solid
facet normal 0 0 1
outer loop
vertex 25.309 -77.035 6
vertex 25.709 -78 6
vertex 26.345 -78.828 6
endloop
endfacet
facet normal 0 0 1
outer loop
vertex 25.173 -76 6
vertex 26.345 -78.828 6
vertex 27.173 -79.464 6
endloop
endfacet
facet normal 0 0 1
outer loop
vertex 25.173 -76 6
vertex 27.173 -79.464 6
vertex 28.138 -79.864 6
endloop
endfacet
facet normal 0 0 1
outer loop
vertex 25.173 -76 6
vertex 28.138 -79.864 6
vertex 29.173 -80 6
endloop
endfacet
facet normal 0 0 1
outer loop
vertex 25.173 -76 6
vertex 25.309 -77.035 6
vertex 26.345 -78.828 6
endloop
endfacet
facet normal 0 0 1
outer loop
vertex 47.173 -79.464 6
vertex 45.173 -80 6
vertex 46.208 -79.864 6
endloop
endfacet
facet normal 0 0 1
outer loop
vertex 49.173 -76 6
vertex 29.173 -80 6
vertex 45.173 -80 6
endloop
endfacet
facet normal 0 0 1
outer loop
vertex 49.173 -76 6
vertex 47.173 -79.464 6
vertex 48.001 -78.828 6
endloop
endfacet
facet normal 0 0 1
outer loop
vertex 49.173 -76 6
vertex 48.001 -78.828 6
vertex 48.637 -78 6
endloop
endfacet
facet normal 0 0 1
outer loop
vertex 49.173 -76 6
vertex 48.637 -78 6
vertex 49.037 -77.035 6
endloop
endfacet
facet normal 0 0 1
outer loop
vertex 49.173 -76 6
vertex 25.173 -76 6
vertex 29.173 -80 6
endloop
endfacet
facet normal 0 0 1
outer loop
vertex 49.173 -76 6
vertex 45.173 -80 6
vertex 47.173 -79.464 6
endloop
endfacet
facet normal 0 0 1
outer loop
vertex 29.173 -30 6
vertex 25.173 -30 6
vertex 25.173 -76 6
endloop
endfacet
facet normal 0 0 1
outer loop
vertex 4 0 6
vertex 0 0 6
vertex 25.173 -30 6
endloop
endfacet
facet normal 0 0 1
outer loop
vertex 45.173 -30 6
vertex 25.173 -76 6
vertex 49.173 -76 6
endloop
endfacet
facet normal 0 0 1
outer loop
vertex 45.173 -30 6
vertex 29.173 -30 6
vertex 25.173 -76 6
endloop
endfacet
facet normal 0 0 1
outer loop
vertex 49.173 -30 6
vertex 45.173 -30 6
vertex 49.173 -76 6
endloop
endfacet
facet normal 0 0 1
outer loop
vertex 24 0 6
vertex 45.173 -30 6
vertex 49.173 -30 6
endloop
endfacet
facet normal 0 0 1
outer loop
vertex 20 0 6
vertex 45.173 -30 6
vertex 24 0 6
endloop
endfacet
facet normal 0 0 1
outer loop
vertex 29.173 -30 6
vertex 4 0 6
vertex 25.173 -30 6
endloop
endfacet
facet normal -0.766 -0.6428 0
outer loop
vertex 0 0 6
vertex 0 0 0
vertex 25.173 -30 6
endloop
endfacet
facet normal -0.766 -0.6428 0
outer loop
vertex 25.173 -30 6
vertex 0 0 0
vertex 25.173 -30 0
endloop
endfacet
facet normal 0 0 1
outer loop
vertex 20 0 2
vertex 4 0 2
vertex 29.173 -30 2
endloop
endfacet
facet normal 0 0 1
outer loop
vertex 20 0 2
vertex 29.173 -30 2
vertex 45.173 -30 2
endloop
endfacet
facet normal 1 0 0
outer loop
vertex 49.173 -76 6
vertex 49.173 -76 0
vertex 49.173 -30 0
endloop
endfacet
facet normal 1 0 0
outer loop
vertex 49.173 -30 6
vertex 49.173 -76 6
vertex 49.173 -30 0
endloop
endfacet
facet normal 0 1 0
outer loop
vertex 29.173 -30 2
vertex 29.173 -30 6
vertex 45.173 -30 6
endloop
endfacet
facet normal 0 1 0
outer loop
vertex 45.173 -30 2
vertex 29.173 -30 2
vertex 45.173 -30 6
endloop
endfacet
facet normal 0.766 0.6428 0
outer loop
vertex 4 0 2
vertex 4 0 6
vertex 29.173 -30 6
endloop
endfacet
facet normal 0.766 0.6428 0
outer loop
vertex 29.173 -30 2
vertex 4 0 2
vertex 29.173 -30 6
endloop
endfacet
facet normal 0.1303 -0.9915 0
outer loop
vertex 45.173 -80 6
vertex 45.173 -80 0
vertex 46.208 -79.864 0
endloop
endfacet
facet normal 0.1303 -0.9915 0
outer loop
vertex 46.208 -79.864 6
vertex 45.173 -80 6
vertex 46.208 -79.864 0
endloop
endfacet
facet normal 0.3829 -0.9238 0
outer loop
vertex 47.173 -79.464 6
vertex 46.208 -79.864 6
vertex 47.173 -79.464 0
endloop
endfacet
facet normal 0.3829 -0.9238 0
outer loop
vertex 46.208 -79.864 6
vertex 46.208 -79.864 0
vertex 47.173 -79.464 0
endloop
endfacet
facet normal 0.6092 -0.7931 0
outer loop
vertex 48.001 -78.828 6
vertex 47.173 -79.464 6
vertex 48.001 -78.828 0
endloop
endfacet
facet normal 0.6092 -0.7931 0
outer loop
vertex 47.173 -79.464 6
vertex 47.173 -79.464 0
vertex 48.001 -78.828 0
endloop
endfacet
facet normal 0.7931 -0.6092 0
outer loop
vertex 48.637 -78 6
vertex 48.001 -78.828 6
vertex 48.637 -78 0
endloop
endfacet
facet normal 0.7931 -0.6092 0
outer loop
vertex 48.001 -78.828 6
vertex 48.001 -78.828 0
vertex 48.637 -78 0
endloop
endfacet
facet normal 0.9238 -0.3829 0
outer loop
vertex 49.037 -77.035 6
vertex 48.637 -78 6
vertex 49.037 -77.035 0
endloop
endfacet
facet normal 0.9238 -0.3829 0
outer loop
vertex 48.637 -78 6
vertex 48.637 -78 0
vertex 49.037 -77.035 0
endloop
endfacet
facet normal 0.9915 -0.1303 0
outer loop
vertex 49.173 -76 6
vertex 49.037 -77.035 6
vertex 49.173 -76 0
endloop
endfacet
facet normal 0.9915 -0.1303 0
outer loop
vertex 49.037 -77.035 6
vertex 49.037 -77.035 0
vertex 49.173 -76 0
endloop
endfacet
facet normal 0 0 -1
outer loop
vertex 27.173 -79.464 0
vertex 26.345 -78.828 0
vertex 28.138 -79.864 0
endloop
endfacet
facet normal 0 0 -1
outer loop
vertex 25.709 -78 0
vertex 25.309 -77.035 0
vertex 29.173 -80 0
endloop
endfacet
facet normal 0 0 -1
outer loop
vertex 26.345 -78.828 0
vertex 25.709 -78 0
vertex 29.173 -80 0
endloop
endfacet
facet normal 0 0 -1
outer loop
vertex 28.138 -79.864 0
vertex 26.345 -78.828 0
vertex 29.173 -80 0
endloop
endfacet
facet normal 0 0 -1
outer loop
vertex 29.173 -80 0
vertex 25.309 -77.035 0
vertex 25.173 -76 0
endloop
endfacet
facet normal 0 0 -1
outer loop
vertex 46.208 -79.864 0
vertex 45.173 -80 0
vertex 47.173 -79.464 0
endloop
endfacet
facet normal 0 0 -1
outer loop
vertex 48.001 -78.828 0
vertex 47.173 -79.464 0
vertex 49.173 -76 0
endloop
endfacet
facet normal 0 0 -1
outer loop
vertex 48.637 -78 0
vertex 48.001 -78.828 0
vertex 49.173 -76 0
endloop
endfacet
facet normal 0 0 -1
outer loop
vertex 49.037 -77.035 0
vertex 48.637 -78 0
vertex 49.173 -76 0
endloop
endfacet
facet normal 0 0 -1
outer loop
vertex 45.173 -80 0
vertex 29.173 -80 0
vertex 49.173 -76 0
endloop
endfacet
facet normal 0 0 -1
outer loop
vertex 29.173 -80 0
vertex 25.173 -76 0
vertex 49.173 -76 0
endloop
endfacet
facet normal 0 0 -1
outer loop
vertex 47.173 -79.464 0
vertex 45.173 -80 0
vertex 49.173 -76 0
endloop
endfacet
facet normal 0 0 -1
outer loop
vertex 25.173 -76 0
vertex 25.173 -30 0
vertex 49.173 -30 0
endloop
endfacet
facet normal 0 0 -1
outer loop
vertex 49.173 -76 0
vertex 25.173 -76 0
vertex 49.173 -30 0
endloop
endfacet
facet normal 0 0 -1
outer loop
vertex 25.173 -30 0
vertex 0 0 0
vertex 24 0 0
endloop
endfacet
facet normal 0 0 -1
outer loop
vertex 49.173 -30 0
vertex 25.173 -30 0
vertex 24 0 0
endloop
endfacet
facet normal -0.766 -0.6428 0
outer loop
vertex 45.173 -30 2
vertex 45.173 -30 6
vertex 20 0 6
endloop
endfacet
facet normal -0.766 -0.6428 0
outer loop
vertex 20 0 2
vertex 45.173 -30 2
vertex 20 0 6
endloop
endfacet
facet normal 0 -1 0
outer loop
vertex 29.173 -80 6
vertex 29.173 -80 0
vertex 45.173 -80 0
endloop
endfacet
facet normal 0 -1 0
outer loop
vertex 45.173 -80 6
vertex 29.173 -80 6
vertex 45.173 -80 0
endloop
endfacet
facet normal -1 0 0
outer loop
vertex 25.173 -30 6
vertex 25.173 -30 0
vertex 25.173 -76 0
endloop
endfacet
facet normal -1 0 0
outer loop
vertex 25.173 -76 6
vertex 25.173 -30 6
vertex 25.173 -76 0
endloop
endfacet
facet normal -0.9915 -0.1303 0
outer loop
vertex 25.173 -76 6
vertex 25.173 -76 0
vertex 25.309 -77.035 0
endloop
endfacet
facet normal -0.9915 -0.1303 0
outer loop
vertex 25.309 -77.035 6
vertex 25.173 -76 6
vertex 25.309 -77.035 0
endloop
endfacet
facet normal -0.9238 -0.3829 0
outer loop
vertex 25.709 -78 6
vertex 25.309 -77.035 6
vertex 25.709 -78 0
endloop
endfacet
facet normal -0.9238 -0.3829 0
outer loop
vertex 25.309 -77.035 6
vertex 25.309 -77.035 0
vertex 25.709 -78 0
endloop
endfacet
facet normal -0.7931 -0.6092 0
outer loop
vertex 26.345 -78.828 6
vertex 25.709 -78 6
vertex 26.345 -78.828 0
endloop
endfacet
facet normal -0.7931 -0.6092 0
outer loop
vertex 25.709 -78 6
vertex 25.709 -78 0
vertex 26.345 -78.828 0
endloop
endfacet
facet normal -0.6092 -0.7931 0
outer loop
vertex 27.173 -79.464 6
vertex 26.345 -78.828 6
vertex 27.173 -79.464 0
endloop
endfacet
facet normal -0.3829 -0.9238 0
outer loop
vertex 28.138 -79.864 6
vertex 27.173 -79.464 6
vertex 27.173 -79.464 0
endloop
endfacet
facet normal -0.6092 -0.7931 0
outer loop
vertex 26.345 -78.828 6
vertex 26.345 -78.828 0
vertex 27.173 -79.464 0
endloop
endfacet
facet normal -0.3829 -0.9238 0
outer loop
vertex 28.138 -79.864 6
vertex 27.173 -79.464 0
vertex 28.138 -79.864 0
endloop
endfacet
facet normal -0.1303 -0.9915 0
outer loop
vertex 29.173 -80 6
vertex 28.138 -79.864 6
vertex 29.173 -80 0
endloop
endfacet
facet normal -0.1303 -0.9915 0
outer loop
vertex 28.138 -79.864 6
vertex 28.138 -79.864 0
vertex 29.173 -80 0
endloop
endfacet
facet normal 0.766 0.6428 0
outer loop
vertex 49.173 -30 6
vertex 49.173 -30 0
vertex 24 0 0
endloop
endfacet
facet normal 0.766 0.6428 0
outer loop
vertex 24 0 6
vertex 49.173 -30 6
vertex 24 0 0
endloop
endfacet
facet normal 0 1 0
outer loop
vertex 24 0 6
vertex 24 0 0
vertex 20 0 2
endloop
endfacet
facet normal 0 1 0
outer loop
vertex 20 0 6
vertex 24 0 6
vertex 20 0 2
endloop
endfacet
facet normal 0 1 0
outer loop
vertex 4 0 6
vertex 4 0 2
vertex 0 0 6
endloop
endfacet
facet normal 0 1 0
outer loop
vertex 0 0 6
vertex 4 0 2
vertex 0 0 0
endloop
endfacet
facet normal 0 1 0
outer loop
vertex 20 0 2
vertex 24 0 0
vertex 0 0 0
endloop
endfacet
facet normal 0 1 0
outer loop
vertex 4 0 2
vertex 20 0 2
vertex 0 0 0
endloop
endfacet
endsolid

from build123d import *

# Parameters (mm, degrees)
F1_DEPTH = 6
F3_DEPTH = 4


with BuildPart() as f1:
    # F0 (on Top) → F1 (new body)
    with BuildSketch(Plane.XY):
        with BuildLine():
            ThreePointArc((45.172989, -80), (48.001416, -78.828427), (49.172989, -76))
            Line((49.172989, -76), (49.172989, -30))
            Line((49.172989, -30), (24, 0))
            Line((24, 0), (0, 0))
            Line((0, 0), (25.172989, -30))
            Line((25.172989, -30), (25.172989, -76))
            ThreePointArc((25.172989, -76), (26.344562, -78.828427), (29.172989, -80))
            Line((29.172989, -80), (45.172989, -80))
        make_face()
    extrude(amount=F1_DEPTH)

    # F2 (on face) → F3 (cut)
    with BuildSketch(Plane.XY.offset(6)):
        Polygon((4, 0), (29.172989, -30), (45.172989, -30), (20, 0), align=None)
    extrude(amount=-F3_DEPTH, mode=Mode.SUBTRACT)


solid = f1.part
